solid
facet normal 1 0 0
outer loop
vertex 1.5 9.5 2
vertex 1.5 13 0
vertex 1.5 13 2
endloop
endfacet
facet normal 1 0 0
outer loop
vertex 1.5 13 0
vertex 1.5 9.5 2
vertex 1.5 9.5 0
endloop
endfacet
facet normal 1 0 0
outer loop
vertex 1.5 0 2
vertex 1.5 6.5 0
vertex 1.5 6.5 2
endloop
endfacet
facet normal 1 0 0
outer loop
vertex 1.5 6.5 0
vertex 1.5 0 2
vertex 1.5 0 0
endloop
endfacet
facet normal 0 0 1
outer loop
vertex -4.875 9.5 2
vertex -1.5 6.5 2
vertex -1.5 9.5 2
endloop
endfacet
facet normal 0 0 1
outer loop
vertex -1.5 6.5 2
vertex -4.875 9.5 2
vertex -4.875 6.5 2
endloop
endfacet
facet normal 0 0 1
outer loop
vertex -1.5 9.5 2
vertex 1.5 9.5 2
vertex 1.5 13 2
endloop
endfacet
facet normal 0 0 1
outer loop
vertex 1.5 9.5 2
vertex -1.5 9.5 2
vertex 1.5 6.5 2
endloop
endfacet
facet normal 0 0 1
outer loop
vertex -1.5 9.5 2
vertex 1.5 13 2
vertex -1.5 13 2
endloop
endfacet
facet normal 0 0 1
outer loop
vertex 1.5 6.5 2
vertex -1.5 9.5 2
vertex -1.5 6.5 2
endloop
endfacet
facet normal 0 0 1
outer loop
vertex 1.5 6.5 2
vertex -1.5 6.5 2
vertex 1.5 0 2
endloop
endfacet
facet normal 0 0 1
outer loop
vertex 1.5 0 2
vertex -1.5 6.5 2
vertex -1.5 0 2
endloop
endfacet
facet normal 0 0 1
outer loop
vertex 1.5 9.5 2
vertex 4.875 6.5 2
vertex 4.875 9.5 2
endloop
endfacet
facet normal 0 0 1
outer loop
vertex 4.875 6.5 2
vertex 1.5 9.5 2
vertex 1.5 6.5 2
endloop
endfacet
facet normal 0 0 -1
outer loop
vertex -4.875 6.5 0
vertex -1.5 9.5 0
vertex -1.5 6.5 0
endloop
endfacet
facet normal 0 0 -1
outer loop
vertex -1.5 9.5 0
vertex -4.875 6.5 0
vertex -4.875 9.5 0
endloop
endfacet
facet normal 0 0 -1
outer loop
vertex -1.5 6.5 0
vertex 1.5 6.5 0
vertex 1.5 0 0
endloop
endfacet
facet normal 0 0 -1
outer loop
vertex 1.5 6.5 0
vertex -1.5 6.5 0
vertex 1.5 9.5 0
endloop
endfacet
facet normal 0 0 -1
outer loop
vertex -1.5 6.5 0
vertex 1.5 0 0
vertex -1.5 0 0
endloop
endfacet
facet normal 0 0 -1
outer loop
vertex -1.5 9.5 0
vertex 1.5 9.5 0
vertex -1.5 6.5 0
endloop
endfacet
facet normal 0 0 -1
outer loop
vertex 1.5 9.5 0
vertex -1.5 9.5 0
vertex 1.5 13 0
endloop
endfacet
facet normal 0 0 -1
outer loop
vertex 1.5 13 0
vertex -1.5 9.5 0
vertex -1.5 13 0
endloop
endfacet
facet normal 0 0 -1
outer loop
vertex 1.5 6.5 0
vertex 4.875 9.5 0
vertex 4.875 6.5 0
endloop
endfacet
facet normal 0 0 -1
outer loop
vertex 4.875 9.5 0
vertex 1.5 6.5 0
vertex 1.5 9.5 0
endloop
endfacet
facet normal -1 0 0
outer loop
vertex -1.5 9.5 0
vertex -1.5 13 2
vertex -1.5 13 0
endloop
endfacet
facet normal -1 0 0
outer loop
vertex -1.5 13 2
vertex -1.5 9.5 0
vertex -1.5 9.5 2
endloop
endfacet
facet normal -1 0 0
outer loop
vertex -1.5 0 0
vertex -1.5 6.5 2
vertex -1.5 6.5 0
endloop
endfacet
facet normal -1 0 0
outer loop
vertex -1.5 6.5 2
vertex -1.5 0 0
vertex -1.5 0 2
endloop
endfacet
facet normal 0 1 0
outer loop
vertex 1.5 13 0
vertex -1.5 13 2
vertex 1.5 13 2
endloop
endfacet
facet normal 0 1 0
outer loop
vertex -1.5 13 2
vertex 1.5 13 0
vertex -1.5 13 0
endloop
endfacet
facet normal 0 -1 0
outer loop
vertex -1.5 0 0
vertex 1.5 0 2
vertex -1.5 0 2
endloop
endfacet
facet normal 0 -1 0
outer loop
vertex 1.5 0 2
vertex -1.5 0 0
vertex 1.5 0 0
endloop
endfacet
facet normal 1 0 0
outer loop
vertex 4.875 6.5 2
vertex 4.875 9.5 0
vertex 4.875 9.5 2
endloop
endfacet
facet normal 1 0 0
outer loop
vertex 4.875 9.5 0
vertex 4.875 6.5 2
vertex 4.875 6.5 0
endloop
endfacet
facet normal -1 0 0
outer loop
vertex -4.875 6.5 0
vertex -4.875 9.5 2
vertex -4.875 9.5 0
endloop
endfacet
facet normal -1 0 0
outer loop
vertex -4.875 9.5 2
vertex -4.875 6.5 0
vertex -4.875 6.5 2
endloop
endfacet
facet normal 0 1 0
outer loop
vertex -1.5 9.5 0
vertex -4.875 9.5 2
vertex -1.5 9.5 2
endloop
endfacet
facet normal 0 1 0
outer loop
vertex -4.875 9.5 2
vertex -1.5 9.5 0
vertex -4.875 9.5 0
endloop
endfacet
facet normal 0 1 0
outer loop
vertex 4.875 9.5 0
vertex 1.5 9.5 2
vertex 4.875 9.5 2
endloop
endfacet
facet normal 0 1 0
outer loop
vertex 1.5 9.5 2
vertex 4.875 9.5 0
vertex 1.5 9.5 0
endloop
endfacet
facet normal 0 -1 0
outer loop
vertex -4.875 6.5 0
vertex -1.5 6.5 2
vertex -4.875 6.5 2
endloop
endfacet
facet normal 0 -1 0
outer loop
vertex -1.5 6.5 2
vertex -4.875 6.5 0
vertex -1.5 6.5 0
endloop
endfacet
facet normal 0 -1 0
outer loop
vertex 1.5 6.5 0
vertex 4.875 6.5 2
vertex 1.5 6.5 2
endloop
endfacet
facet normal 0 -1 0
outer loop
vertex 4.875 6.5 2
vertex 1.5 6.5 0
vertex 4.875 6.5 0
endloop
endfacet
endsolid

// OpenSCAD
crucifixionCcross();

module crucifixionCcross(height=2)
{
    beamWidth = 3;
    
    union()
    {
        // vertical beam
        xTranslate = -beamWidth / 2.0;
        yLength = 13;
        color("brown")
        translate([xTranslate, 0, 0])
        cube([3, yLength, height]);

        // horizontal beam        
        yTranslate = yLength * 0.5;
        xLength = yLength * 0.75;
        xTranslateHBeam = -xLength / 2.0;
        
        color("green")
        translate([xTranslateHBeam, yTranslate, 0])
        cube([xLength, 3, height]);        
    }        
}
